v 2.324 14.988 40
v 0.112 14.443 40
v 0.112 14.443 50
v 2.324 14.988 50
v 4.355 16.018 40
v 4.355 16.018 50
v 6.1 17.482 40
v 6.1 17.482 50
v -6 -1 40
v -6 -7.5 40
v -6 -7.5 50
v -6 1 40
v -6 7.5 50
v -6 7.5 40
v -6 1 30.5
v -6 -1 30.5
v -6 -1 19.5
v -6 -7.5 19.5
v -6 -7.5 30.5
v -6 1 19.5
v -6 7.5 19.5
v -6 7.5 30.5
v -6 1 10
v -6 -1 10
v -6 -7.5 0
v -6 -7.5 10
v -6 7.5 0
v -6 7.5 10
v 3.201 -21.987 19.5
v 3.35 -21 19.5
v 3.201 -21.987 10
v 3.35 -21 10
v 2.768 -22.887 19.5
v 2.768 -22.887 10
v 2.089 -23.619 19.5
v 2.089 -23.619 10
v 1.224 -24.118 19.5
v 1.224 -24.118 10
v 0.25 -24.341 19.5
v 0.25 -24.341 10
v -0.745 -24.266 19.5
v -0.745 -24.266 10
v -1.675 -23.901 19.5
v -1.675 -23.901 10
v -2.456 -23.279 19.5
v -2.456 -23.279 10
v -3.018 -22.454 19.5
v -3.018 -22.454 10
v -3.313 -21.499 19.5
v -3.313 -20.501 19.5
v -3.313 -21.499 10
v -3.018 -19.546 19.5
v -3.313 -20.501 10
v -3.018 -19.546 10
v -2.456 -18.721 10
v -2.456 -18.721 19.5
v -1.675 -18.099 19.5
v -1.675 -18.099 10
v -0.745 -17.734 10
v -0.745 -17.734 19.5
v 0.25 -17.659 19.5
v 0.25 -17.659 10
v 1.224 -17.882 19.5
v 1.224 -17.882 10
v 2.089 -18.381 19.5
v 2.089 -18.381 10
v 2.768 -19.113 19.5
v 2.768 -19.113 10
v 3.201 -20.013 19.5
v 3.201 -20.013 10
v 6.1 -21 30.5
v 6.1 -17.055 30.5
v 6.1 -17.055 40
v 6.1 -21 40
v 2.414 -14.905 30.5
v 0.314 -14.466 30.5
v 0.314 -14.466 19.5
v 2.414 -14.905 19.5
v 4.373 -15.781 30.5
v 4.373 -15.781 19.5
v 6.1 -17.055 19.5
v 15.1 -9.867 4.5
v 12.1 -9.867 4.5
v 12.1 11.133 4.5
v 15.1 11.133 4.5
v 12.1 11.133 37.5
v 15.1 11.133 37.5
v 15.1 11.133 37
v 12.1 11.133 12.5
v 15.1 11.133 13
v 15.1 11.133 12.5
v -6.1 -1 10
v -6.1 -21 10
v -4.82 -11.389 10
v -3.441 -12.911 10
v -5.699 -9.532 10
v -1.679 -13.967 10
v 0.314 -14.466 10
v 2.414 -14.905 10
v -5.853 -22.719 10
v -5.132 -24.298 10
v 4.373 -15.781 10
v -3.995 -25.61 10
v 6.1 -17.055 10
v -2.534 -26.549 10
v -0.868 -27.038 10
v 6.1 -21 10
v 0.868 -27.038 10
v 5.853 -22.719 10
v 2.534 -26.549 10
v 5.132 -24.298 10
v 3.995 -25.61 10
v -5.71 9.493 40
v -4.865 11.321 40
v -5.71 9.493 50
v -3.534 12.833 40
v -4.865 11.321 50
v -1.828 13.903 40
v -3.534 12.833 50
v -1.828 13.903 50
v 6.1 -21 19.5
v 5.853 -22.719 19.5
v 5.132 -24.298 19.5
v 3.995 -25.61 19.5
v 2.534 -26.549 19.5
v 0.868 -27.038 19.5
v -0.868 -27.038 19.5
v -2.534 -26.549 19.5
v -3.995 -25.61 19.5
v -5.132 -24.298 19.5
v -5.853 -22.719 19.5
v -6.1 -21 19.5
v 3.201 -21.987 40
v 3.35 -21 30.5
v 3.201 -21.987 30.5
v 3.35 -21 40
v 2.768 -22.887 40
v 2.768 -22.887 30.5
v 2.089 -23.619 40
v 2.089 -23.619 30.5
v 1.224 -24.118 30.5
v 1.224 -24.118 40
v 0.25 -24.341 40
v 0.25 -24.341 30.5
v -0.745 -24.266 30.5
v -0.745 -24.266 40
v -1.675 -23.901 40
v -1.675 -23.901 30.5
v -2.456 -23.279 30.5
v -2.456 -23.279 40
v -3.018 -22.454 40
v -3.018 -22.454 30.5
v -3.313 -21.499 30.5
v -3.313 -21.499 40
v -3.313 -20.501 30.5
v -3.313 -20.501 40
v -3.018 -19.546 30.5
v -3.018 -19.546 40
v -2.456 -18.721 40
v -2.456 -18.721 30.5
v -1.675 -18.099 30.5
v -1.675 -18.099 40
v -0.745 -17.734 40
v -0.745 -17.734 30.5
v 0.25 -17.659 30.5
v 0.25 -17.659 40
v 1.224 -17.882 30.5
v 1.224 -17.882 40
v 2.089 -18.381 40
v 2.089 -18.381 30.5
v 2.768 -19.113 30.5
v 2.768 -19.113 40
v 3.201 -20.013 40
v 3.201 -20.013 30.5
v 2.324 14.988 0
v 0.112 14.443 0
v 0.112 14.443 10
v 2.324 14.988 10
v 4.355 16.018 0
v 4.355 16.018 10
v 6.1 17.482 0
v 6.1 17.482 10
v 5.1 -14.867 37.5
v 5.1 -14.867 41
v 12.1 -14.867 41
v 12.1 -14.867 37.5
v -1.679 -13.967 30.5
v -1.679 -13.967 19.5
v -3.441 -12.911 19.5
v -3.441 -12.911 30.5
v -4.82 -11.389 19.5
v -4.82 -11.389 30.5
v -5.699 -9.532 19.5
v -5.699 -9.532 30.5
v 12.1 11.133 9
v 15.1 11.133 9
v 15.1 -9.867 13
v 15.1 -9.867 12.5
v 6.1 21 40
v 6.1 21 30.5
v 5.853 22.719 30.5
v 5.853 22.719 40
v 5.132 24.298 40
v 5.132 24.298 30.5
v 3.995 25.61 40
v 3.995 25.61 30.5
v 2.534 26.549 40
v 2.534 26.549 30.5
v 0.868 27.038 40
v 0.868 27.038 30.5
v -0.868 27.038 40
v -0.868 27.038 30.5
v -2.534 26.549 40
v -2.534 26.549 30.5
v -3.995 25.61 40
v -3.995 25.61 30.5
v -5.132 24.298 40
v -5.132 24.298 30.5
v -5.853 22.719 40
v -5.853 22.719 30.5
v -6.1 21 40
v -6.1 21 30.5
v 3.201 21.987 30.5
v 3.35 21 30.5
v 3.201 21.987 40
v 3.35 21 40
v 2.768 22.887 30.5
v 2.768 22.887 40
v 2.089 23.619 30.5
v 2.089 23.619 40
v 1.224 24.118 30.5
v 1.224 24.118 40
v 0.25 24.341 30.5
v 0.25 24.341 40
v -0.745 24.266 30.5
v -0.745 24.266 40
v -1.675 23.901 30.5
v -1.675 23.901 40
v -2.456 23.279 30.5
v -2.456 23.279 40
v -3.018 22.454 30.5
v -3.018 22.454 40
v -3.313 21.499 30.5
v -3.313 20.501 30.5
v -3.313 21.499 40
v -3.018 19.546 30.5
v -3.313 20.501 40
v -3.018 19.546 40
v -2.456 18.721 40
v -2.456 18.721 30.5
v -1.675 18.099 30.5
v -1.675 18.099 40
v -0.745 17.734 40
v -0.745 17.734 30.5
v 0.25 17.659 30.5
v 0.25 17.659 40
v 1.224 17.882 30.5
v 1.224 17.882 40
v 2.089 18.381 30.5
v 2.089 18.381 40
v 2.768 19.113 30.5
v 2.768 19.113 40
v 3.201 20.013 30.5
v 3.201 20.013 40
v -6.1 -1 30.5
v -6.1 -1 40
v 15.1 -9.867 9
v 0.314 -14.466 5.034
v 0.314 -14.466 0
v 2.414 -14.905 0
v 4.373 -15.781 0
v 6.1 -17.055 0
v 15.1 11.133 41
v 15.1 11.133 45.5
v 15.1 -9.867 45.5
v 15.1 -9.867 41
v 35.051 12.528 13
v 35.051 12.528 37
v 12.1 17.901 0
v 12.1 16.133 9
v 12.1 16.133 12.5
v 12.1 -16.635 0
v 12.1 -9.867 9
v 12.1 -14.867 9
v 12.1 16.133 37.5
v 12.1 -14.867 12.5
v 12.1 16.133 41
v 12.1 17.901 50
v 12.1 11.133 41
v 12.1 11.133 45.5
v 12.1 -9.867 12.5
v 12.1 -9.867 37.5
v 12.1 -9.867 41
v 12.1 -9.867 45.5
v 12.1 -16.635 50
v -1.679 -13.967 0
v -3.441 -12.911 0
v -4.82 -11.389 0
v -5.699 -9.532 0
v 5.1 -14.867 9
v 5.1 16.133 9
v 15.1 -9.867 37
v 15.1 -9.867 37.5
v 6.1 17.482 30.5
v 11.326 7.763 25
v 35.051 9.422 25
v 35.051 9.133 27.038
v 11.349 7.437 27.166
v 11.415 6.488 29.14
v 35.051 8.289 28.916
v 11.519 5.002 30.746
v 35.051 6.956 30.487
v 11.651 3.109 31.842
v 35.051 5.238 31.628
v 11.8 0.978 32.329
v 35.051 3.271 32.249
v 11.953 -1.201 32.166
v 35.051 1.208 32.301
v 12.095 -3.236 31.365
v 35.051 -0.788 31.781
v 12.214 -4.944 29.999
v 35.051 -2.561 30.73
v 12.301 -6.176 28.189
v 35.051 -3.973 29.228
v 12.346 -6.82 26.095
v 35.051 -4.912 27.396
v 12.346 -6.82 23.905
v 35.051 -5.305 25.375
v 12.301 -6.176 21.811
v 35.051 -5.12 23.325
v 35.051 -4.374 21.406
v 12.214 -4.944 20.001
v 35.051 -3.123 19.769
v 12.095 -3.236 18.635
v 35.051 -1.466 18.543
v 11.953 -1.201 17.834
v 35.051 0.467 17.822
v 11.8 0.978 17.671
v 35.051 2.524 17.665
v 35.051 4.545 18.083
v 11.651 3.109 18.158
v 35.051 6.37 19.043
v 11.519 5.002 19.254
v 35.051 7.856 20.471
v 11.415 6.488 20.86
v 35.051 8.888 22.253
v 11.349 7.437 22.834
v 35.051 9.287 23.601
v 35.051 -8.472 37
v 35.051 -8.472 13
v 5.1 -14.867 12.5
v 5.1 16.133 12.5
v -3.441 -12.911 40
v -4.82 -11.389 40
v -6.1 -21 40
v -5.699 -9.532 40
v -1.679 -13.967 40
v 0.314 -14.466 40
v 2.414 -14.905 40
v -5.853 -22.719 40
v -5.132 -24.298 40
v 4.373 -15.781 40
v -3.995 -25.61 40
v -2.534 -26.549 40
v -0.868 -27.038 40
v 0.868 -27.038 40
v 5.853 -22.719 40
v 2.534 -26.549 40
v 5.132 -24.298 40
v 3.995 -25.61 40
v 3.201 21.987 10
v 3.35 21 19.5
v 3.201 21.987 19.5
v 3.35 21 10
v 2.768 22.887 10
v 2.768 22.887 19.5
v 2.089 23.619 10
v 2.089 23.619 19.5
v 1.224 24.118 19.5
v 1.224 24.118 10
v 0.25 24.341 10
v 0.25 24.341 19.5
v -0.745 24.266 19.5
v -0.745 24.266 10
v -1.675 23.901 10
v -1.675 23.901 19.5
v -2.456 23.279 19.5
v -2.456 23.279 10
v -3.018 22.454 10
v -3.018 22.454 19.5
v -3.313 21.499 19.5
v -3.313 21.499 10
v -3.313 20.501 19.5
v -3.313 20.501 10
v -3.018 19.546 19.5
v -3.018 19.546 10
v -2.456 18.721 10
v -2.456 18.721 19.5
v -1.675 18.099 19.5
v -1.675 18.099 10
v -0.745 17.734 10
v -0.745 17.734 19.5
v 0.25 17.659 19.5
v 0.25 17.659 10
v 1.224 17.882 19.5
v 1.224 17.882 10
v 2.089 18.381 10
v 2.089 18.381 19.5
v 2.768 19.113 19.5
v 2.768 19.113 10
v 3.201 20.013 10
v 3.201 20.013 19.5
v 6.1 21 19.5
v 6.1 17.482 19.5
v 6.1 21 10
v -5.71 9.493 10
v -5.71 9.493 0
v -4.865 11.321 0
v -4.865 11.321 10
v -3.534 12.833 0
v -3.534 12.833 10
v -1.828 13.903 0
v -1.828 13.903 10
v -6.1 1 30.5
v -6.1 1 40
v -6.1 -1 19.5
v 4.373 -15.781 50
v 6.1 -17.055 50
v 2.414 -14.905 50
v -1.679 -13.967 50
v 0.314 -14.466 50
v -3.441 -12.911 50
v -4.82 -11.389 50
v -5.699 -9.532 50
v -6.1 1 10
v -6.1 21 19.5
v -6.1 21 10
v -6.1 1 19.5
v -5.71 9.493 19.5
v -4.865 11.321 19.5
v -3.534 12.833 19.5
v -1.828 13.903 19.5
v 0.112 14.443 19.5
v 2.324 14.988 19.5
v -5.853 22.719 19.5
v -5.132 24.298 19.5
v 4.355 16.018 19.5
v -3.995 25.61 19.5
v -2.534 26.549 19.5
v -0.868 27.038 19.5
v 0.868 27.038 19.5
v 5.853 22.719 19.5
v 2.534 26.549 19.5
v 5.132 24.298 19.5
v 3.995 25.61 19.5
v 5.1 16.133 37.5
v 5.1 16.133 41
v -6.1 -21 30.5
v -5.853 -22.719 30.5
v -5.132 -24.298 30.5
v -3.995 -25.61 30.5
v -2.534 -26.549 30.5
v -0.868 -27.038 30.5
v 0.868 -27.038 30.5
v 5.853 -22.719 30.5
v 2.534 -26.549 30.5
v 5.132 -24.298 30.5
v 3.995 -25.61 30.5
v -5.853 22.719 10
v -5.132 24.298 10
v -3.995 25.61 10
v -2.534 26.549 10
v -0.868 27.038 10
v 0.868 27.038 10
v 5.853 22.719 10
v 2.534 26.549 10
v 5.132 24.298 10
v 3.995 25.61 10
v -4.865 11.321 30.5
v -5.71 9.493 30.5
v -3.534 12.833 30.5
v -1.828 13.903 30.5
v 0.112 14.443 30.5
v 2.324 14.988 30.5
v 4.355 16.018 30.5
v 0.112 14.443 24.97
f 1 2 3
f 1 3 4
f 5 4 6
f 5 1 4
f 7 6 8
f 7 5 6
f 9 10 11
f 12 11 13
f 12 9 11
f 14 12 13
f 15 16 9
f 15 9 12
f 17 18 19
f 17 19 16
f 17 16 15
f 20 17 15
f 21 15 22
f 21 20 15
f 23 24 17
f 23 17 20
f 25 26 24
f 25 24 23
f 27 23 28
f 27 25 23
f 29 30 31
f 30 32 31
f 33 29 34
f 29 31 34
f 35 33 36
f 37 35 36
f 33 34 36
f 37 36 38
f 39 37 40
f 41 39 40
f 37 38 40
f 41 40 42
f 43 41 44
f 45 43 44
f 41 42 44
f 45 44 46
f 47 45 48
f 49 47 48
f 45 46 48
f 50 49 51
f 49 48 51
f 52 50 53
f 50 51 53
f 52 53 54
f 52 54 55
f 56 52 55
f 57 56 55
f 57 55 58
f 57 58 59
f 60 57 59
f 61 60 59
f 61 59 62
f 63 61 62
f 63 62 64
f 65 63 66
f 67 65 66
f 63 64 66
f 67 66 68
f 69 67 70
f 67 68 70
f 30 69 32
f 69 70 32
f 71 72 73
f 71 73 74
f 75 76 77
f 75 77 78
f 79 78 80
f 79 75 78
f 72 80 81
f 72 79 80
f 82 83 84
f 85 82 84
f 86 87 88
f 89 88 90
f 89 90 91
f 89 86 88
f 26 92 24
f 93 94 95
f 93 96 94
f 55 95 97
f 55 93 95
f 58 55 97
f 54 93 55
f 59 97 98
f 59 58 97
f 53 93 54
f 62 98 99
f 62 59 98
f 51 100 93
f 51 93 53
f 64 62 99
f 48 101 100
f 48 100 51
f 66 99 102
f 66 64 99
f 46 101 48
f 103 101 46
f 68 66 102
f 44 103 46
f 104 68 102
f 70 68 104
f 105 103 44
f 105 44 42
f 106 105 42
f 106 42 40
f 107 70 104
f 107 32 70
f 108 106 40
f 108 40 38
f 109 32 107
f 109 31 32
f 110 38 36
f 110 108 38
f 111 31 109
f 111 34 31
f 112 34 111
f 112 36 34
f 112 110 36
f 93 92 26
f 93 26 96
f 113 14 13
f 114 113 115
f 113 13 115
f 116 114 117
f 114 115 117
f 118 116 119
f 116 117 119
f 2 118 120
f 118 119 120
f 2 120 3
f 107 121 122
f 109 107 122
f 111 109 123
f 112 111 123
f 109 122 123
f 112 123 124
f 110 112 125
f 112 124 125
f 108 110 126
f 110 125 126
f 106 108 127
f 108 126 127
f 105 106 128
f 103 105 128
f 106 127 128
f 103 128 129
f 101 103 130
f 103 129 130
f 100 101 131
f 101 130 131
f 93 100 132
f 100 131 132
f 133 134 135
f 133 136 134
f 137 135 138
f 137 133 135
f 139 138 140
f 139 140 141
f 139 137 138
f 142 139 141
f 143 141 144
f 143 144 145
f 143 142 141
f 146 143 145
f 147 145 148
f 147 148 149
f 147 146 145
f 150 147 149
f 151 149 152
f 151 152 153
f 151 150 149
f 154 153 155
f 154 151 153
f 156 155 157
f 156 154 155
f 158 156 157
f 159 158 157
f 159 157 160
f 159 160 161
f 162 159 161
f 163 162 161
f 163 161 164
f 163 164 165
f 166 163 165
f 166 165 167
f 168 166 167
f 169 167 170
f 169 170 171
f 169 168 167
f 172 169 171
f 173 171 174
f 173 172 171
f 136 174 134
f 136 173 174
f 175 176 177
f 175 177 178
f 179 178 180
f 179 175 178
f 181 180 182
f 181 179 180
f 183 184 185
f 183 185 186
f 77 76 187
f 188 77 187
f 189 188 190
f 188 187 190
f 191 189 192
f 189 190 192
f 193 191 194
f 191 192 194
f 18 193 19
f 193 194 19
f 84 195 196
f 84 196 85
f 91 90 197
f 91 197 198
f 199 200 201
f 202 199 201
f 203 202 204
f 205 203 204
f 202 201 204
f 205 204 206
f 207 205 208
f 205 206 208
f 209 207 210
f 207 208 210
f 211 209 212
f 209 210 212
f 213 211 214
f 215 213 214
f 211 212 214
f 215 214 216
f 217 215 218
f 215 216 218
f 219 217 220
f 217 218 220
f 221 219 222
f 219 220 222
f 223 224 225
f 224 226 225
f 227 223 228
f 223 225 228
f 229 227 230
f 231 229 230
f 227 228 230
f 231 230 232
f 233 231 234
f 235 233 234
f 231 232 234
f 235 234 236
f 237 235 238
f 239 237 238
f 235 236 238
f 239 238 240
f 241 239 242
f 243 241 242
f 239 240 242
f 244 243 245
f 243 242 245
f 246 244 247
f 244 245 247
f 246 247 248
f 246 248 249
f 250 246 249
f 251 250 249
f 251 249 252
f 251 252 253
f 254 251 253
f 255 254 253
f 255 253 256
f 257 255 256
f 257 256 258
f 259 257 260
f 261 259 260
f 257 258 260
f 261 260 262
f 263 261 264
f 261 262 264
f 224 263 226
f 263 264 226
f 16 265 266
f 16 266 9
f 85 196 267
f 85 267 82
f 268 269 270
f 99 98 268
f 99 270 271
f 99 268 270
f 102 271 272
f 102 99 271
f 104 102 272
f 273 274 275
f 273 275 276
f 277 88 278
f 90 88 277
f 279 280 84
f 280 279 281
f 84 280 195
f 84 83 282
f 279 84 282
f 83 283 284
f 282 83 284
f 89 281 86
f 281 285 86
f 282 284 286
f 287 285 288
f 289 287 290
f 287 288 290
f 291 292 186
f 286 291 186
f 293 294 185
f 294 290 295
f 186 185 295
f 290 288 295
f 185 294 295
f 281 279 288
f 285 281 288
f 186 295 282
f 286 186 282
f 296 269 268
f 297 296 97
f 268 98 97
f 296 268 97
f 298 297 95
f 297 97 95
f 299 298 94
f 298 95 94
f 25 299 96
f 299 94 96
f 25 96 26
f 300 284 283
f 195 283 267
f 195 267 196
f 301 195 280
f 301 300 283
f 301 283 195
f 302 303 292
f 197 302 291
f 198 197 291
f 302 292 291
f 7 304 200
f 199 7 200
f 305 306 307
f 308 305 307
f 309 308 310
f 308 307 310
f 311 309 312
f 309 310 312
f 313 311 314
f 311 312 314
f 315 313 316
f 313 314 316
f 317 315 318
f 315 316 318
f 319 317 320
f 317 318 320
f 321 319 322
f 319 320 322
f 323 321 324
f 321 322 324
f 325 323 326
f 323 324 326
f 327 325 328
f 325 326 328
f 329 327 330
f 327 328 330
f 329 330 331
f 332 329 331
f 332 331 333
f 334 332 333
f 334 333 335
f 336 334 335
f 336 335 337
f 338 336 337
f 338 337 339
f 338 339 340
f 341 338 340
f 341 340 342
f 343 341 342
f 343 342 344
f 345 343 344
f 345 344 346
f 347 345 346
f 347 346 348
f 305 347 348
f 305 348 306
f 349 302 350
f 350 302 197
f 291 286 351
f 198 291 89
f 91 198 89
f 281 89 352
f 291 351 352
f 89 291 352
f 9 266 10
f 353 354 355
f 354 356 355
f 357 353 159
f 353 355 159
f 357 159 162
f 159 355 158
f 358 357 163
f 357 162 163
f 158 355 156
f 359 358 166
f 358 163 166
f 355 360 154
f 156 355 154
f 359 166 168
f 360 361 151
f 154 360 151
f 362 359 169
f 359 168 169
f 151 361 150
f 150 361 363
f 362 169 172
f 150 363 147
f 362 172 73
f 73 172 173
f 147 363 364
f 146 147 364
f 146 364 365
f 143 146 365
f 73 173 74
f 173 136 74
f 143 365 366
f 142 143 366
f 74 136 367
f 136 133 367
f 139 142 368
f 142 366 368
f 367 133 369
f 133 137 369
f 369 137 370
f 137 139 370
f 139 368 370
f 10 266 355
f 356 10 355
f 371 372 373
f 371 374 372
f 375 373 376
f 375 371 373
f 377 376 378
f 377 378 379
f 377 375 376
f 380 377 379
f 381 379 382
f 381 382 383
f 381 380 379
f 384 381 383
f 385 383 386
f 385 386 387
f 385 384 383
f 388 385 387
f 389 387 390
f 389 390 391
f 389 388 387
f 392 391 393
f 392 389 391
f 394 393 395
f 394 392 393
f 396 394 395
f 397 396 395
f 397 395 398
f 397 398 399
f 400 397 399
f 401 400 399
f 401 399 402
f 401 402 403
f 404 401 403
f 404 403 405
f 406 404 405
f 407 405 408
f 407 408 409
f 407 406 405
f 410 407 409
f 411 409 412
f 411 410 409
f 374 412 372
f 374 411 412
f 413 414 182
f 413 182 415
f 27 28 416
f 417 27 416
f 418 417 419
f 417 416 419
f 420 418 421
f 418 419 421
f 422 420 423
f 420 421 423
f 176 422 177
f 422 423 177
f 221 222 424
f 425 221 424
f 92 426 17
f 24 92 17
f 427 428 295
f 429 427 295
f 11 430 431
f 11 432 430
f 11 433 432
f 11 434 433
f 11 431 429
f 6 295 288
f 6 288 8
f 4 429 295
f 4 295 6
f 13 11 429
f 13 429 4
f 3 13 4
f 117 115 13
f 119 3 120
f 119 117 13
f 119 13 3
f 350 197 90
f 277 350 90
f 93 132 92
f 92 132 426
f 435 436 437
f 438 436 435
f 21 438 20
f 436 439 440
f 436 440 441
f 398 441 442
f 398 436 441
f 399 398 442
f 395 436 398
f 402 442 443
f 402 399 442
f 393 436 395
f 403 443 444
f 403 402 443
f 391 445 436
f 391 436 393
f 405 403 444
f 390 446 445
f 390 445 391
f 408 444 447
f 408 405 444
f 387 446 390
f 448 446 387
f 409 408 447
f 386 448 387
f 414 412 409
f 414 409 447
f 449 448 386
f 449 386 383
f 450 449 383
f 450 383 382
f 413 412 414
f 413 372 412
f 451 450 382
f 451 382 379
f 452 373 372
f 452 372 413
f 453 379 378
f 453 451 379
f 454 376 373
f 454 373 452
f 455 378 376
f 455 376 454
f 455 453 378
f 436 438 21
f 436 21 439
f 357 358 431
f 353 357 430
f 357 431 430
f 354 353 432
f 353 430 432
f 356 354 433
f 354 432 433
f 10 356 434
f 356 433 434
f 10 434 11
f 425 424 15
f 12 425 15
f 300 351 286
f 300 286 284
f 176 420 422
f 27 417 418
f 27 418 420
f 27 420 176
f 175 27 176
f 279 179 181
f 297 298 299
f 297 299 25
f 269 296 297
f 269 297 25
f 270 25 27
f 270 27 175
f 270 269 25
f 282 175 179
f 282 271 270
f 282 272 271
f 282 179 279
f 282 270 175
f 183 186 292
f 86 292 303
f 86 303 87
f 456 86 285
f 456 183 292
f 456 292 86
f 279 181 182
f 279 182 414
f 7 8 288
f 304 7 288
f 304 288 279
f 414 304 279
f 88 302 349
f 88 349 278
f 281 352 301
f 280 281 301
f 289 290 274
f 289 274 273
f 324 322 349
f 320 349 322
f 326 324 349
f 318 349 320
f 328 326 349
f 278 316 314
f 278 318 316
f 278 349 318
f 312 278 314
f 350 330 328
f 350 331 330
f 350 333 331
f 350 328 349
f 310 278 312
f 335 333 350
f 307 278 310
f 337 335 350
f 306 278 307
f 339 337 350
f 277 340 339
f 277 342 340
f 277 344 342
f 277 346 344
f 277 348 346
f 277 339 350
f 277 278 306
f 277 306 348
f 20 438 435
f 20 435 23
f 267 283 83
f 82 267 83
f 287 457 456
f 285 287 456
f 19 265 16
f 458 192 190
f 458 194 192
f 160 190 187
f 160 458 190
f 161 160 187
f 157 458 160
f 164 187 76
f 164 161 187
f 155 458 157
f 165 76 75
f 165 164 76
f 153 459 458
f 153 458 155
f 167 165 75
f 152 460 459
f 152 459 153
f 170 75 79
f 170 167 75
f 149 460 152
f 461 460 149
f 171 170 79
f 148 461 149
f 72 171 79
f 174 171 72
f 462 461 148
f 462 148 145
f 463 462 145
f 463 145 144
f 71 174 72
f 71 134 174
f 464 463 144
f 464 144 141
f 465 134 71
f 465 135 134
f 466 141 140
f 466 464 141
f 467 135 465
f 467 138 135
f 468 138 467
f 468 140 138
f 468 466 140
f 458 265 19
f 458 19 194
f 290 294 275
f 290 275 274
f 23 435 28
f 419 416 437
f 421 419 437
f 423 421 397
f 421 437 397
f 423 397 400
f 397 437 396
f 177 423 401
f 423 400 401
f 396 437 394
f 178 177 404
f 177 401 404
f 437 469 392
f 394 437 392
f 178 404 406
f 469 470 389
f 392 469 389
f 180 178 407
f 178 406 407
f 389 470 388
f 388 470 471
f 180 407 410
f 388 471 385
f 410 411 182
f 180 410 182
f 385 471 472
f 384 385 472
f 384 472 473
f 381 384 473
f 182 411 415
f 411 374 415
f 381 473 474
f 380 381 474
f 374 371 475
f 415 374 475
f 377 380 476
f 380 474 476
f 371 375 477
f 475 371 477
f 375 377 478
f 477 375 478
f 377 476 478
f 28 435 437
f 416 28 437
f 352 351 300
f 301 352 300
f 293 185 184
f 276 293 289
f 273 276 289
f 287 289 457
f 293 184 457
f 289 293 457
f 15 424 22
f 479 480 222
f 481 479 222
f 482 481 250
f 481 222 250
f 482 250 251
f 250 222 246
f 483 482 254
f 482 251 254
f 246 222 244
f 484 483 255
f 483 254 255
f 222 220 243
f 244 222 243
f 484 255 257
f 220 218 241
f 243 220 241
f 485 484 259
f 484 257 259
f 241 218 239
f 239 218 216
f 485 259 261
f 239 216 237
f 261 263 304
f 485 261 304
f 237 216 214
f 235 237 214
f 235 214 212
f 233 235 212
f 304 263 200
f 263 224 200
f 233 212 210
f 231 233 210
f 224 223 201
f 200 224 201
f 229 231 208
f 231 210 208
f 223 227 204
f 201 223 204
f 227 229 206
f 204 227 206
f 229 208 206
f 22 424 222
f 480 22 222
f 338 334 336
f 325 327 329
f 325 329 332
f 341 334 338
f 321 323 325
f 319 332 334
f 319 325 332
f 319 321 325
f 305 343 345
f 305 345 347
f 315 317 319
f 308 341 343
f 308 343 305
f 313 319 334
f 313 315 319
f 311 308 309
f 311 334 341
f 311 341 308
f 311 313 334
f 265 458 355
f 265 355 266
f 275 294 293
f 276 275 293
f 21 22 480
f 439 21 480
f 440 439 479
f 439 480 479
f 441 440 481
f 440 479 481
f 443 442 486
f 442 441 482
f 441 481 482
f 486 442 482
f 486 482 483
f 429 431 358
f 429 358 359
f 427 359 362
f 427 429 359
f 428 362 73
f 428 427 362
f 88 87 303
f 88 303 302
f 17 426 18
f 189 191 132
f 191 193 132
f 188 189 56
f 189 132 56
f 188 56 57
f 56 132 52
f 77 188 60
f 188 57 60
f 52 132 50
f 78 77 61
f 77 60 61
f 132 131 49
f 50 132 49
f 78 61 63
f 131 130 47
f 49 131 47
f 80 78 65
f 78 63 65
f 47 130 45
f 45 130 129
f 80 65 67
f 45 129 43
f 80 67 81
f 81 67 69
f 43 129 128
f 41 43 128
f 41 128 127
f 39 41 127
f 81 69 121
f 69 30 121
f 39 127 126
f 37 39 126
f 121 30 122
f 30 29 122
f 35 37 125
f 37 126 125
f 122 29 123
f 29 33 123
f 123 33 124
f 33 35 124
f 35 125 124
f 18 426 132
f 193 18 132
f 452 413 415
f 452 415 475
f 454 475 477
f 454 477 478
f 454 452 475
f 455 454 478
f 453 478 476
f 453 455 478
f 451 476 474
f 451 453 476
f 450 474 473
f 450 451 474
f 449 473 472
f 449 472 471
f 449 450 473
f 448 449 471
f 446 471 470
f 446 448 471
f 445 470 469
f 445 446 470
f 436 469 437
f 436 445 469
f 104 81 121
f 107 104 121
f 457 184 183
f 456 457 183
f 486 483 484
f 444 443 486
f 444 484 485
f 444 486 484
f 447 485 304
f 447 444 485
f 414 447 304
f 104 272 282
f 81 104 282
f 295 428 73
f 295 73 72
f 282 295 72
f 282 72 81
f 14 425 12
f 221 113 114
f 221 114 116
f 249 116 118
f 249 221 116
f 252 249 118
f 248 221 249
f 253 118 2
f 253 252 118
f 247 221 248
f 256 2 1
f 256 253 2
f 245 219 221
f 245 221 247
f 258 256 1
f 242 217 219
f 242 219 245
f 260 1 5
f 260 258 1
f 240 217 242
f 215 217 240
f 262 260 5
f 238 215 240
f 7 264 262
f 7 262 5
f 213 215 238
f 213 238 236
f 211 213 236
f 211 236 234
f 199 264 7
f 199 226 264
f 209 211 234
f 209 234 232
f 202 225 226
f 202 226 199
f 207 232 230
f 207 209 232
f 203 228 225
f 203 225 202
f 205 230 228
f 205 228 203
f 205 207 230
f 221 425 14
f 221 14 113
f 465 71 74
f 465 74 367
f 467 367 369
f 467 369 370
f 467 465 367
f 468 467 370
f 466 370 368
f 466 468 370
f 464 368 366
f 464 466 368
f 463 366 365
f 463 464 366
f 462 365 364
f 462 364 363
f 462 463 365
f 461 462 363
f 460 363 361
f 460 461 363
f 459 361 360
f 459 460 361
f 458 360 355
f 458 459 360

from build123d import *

# Parameters (mm, degrees)
SKETCH4_W               = 13
SKETCH4_H               = 29
BOSS_EXTRUDE1_DEPTH     = 50
SKETCH6_R               = 3.35
BOSS_EXTRUDE2_DEPTH     = 4.75
MIRROR2_COPY_1_SKETCH_R = 3.35
MIRROR2_COPY_1_DEPTH    = 4.75
FILLET2_R               = 7
SKETCH7_W               = 50
SKETCH7_H               = 34.11
BOSS_EXTRUDE3_DEPTH     = 6
BOSS_EXTRUDE4_REACH     = 60.145
CUT_EXTRUDE1_DEPTH      = 59.144819202
SKETCH10_W              = 41
SKETCH10_H              = 21
BOSS_EXTRUDE5_DEPTH     = 3
FILLET4_R               = 10
CUT_EXTRUDE2_DEPTH      = 60.713063897
CUT_EXTRUDE2_DEPTH_BACK = 7
SKETCH11_W              = 3.5
SKETCH11_H              = 31
SKETCH12_W              = 24
SKETCH12_H              = 21
BOSS_EXTRUDE7_DEPTH     = 20
SKETCH15_R              = 7.35
CUT_EXTRUDE3_DEPTH      = 24


with BuildPart() as part:
    # Sketch4 → Boss-Extrude1 (new body)
    with BuildSketch(Plane.XY):
        with Locations((0.5, 0)):
            Rectangle(SKETCH4_W, SKETCH4_H)
    extrude(amount=BOSS_EXTRUDE1_DEPTH)

    # Sketch6 → Boss-Extrude2 (add, symmetric)
    with BuildSketch(Plane.XY.offset(14.75)):
        with BuildLine():
            Line((6.1, 1), (6.1, 21))
            ThreePointArc((6.1, 21), (0, 27.1), (-6.1, 21))
            Line((-6.1, 21), (-6.1, 1))
            Line((-6.1, 1), (6.1, 1))
        make_face()
        with Locations((0, 21)):
            Circle(SKETCH6_R, mode=Mode.SUBTRACT)
    boss_extrude2 = extrude(amount=BOSS_EXTRUDE2_DEPTH, both=True)

    # Mirror1: Boss-Extrude2 across plane
    add(boss_extrude2.mirror(Plane.XY.offset(25)))

    # Mirror2: Boss-Extrude2 across plane
    add(boss_extrude2.mirror(Plane.ZX))

    # Mirror2 copy 1 sketch → Mirror2 copy 1 (add, symmetric)
    with BuildSketch(Plane(origin=(0, 0, 35.25), x_dir=(1, 0, 0), z_dir=(0, 0, -1))):
        with BuildLine():
            Line((6.1, 1), (6.1, 21))
            ThreePointArc((6.1, 21), (0, 27.1), (-6.1, 21))
            Line((-6.1, 21), (-6.1, 1))
            Line((-6.1, 1), (6.1, 1))
        make_face()
        with Locations((0, 21)):
            Circle(MIRROR2_COPY_1_SKETCH_R, mode=Mode.SUBTRACT)
    extrude(amount=MIRROR2_COPY_1_DEPTH, both=True)

    # Fillet2
    fillet2_edges = [part.edges().sort_by_distance(p)[0] for p in [
        (-6, 14.5, 5),
        (-6, 14.5, 25),
        (-6, -14.5, 5),
        (-6, -14.5, 25),
        (-6, 14.5, 45),
        (-6, -14.5, 45),
    ]]
    fillet(fillet2_edges, radius=FILLET2_R)

    # Sketch7 → Boss-Extrude3 (add)
    with BuildSketch(Plane(origin=(6.1, 0, 0), x_dir=(0, 0, -1), z_dir=(1, 0, 0))):
        with Locations((-25, 0)):
            Rectangle(SKETCH7_W, SKETCH7_H)
    extrude(amount=BOSS_EXTRUDE3_DEPTH)

    # Boss-Extrude4: up to this face of the body (flat: up to its plane)
    boss_extrude4_end = Plane(part.part.faces().sort_by_distance((3.691573852, 0, 0))[0])
    # Sketch8 → Boss-Extrude4 (add, up to the picked face)
    with BuildSketch(Plane.XY.offset(50), mode=Mode.PRIVATE) as boss_extrude4_sk1:
        Polygon((6.1, 17.481553553), (12.1, 17.901114425), (12.1, 17.055), (6.1, 17.055), align=None)
    boss_extrude4_tool1 = split(extrude(boss_extrude4_sk1.sketch, amount=-BOSS_EXTRUDE4_REACH, mode=Mode.PRIVATE), bisect_by=boss_extrude4_end, keep=Keep.BOTH, mode=Mode.PRIVATE)
    add(boss_extrude4_tool1.solids().sort_by(Axis((9.42967, 17.384693, 50), (0, 0, -1)))[0])

    # Sketch9 → Cut-Extrude1 (cut, through all)
    with BuildSketch(Plane.XY.offset(50)):
        Polygon((6.1, -17.055), (17.728439632, -16.241860289), (17.728439632, -20.144237666), (6.1, -20.144237666), align=None)
    extrude(amount=-CUT_EXTRUDE1_DEPTH, mode=Mode.SUBTRACT)

    # Sketch10 → Boss-Extrude5 (add)
    with BuildSketch(Plane(origin=(12.1, 0, 0), x_dir=(0, 0, -1), z_dir=(1, 0, 0))):
        with Locations((-25, 0.632837648)):
            Rectangle(SKETCH10_W, SKETCH10_H)
    extrude(amount=BOSS_EXTRUDE5_DEPTH)

    # Fillet4
    # the kernel refuses this fillet: 10 mm, written as the material it adds along each edge
    with BuildSketch(Plane(origin=(6.1, -14.5, 50), x_dir=(0, -1, 0), z_dir=(0, 0, -1))) as fillet4_piece_1:
        with BuildLine():
            CenterArc((9.918128411, 6.76641264), FILLET4_R, 185.625410645, 36.956323183)
            Line((-0.033711831, 5.78616991), (-1.028895855, 5.688145638))
            ThreePointArc((-1.028895855, 5.688145638), (-1, 5.1), (-1, 0))
            Line((-1, 0), (0, -1))
            ThreePointArc((0, -1), (1.2775, -1), (1.818687159, -0.676641264))
            Line((1.818687159, -0.676641264), (2.555, 0))
        make_face()
    extrude(amount=24.465670292)
    with BuildSketch(Plane(origin=(6.1, -14.5, 44.965670292), x_dir=(0, -1, 0), z_dir=(0, 0, -1))) as fillet4_piece_2:
        with BuildLine():
            CenterArc((9.918128411, 6.76641264), FILLET4_R, 185.625410645, 36.956323183)
            Line((-0.033711831, 5.78616991), (-1.028895855, 5.688145638))
            ThreePointArc((-1.028895855, 5.688145638), (-1, 5.1), (-1, 0))
            Line((-1, 0), (0, -1))
            ThreePointArc((0, -1), (1.2775, -1), (1.818687159, -0.676641264))
            Line((1.818687159, -0.676641264), (2.555, 0))
        make_face()
    extrude(amount=39.931340584)
    with BuildSketch(Plane(origin=(6.1, -14.5, 24.465670292), x_dir=(-0.9999830276779416, 0.005826178512287368, 0), z_dir=(0, 0, -1))) as fillet4_piece_3:
        with BuildLine():
            CenterArc((6.708513011, -9.957382405), FILLET4_R, 95.291593317, 36.956323183)
            Line((-0.014885886, -2.554956636), (-0.687225776, -1.814714059))
            ThreePointArc((-0.687225776, -1.814714059), (-1.007425971, -1.271652139), (-0.999983028, 0.005826179))
            Line((-0.999983028, 0.005826179), (0.005826179, 0.999983028))
            ThreePointArc((0.005826179, 0.999983028), (5.10573962, 0.970269517), (5.694043627, 0.99573824))
            Line((5.694043627, 0.99573824), (5.786268117, 0))
        make_face()
    extrude(amount=24.465670292)
    with BuildSketch(Plane(origin=(6.1, 14.5, 0), x_dir=(-0.9999554494088081, -0.009439237131707428, 0), z_dir=(0, 0, 1))) as fillet4_piece_4:
        with BuildLine():
            CenterArc((7.162570226, -9.930782909), FILLET4_R, 96.745204553, 39.23266057)
            Line((-0.028143591, -2.981420723), (-0.747214973, -2.286484504))
            ThreePointArc((-0.747214973, -2.286484504), (-1.014027245, -1.481271124), (-0.999955449, 0.009439237))
            Line((-0.999955449, 0.009439237), (0.009439237, 0.999955449))
            ThreePointArc((0.009439237, 0.999955449), (5.109212029, 0.95181534), (5.870573137, 0.993078291))
            Line((5.870573137, 0.993078291), (5.988027418, 0))
        make_face()
    extrude(amount=24.970068545)
    with BuildSketch(Plane(origin=(6.1, 14.5, 4.529931455), x_dir=(0, 1, 0), z_dir=(0, 0, 1))) as fillet4_piece_5:
        with BuildLine():
            CenterArc((9.862731288, 7.255990144), FILLET4_R, 187.286041034, 39.23266057)
            Line((-0.056522411, 5.987760648), (-1.048447781, 5.860937698))
            ThreePointArc((-1.048447781, 5.860937698), (-1, 5.1), (-1, 0))
            Line((-1, 0), (0, -1))
            ThreePointArc((0, -1), (1.490776776, -1), (2.293435779, -0.725599014))
            Line((2.293435779, -0.725599014), (2.981553553, 0))
        make_face()
    extrude(amount=40.940137089)
    with BuildSketch(Plane(origin=(6.1, 14.5, 25.029931455), x_dir=(0, 1, 0), z_dir=(0, 0, 1))) as fillet4_piece_6:
        with BuildLine():
            CenterArc((9.862731288, 7.255990144), FILLET4_R, 187.286041034, 39.23266057)
            Line((-0.056522411, 5.987760648), (-1.048447781, 5.860937698))
            ThreePointArc((-1.048447781, 5.860937698), (-1, 5.1), (-1, 0))
            Line((-1, 0), (0, -1))
            ThreePointArc((0, -1), (1.490776776, -1), (2.293435779, -0.725599014))
            Line((2.293435779, -0.725599014), (2.981553553, 0))
        make_face()
    extrude(amount=24.970068545)

    # Sketch11 → Cut-Extrude2 (cut, two sides: drawn at the far end of the back side and taken through both)
    with BuildSketch(Plane(origin=(12.1, 0, 0), x_dir=(0, 0, -1), z_dir=(1, 0, 0)).offset(-CUT_EXTRUDE2_DEPTH_BACK)):
        with Locations((-10.75, 0.632837648)):
            Rectangle(SKETCH11_W, SKETCH11_H)
        with Locations((-39.25, 0.632837648)):
            Rectangle(SKETCH11_W, SKETCH11_H)
    extrude(amount=CUT_EXTRUDE2_DEPTH + CUT_EXTRUDE2_DEPTH_BACK, mode=Mode.SUBTRACT)

    # Sketch12 → Boss-Extrude7 (add, along a direction that is not the sketch's normal)
    with BuildSketch(Plane(origin=(15.1, 0, 0), x_dir=(0, 0, -1), z_dir=(1, 0, 0))):
        with Locations((-25, 0.632837648)):
            Rectangle(SKETCH12_W, SKETCH12_H)
    extrude(amount=BOSS_EXTRUDE7_DEPTH, dir=(0.9975640502598245, 0.069756473744122, 0))

    # Sketch15 → Cut-Extrude3 (cut)
    with BuildSketch(Plane(origin=(35.752500693, 2.500058392, 0), x_dir=(0, 0, -1), z_dir=(0.9975640502598246, 0.06975647374412185, 0))):
        with Locations(Location((-25, -0.396449194, 0), (0, 0, 90))):
            Circle(SKETCH15_R)
    extrude(amount=-CUT_EXTRUDE3_DEPTH, mode=Mode.SUBTRACT)


solid = part.part
